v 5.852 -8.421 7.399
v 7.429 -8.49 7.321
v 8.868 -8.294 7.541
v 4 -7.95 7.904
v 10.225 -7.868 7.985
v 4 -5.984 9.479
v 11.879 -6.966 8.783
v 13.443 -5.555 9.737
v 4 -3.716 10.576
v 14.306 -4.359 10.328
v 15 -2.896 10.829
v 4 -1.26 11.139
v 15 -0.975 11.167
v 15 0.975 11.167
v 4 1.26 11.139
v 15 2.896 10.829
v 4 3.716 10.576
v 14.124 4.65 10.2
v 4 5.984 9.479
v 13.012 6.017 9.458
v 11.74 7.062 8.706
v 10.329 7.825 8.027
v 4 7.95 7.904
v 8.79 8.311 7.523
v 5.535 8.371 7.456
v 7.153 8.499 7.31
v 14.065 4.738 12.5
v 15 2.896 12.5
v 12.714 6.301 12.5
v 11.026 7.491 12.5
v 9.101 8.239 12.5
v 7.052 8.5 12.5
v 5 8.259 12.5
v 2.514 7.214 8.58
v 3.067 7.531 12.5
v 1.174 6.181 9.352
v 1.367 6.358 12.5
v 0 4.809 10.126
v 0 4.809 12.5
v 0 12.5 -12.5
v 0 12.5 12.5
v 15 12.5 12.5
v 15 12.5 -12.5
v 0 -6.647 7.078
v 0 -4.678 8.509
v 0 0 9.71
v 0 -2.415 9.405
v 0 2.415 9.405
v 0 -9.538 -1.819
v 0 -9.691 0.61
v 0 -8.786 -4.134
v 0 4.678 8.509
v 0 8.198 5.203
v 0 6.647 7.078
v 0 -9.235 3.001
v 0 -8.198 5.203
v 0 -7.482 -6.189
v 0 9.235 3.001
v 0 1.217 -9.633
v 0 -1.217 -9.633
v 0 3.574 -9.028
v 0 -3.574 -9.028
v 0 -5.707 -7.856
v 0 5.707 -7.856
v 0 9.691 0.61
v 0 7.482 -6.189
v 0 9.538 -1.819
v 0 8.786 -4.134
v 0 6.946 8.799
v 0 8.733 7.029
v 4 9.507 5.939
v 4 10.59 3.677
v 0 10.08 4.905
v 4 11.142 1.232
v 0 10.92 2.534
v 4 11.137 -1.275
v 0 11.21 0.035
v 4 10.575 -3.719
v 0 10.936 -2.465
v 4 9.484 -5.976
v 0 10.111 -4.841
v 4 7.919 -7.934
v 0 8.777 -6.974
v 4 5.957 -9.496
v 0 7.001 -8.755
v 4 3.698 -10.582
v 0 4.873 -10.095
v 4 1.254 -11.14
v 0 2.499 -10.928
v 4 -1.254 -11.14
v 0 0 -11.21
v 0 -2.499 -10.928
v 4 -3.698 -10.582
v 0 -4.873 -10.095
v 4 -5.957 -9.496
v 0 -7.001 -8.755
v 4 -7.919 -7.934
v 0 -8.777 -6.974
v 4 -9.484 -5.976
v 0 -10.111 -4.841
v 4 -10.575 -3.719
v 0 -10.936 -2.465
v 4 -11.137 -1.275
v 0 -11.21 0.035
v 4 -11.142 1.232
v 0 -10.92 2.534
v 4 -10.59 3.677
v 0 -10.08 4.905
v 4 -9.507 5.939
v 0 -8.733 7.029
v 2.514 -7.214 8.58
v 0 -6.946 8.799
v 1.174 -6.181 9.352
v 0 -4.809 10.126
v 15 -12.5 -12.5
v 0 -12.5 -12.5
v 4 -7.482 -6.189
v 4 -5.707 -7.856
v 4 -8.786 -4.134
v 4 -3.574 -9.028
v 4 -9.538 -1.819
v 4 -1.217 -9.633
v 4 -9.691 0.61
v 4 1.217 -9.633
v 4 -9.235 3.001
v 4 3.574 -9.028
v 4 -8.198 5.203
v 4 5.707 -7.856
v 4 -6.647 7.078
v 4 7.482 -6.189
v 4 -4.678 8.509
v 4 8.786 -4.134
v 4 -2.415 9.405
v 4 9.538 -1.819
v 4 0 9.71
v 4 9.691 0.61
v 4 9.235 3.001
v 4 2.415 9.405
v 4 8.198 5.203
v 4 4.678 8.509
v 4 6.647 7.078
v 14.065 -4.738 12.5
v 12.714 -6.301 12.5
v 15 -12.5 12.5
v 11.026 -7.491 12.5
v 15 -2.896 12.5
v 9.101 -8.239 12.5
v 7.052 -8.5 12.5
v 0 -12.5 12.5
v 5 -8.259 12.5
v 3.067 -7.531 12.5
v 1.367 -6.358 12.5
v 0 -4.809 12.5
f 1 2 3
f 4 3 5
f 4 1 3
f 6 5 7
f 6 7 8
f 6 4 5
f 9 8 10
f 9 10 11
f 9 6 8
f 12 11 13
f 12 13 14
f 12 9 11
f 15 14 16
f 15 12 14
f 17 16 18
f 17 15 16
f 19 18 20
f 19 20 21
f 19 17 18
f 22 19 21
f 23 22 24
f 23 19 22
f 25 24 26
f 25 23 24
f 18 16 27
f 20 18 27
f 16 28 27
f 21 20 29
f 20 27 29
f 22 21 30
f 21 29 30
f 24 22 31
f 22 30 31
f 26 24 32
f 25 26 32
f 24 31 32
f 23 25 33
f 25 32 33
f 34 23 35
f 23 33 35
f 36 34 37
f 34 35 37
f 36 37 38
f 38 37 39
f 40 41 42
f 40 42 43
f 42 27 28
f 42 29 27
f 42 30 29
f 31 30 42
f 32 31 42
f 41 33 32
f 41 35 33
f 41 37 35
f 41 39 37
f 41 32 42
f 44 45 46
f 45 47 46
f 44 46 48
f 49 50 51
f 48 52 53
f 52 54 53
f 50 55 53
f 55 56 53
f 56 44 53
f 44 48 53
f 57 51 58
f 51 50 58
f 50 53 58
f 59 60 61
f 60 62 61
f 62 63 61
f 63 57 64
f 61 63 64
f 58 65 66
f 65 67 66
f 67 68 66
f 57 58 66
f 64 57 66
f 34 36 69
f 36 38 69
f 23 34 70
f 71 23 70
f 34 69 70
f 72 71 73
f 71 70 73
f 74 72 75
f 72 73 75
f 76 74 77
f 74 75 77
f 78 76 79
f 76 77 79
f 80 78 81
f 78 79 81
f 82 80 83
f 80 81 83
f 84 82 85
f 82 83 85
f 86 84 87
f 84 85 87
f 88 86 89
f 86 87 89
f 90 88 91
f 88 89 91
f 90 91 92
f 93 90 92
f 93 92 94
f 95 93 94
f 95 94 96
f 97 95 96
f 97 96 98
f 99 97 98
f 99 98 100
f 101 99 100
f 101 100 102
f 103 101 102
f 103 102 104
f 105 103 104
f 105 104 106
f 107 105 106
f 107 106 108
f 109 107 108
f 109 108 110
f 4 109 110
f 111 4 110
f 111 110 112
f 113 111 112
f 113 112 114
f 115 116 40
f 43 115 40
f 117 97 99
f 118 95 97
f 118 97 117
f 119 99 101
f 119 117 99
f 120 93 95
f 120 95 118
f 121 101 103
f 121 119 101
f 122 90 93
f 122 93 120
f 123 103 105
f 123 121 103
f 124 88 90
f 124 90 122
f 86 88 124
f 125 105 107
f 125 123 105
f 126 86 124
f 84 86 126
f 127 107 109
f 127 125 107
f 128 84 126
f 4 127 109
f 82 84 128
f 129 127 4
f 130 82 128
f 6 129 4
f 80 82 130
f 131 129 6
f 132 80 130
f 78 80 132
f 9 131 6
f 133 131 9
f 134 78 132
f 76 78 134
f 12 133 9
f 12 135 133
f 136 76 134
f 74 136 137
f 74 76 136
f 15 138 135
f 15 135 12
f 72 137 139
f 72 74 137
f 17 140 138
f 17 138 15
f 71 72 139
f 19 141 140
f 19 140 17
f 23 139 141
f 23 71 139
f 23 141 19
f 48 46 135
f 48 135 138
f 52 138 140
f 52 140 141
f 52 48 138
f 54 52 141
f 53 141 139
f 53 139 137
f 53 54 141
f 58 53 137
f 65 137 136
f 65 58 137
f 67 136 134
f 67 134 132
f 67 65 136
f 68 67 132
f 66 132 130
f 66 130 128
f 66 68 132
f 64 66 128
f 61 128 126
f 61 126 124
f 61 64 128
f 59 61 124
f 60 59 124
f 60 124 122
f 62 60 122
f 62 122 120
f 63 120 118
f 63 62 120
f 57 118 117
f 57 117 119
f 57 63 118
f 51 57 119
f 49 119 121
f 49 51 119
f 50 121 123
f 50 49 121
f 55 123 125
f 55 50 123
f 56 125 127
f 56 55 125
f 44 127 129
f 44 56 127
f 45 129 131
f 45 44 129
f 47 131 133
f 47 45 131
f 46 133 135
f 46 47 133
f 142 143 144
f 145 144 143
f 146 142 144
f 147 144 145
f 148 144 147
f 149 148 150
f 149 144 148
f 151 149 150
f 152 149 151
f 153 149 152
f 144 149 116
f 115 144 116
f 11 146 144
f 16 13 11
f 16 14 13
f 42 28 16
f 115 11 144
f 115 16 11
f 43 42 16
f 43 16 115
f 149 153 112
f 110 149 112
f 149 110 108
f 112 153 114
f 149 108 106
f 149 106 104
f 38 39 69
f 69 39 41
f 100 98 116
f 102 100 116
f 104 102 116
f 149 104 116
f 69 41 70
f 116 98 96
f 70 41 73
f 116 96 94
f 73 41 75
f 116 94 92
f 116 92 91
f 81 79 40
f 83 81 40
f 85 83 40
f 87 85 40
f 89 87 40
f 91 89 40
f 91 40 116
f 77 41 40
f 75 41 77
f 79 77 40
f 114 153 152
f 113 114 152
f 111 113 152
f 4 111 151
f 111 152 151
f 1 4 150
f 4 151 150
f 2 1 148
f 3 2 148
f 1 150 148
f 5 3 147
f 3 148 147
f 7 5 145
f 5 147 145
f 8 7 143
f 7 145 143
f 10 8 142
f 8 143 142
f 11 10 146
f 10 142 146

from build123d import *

# Parameters (mm, degrees)
SKETCH1_W               = 25
SKETCH1_H               = 25
BOSS_EXTRUDE1_DEPTH     = 15
SKETCH2_R               = 11.21
SKETCH2_R_2             = 9.71
CUT_EXTRUDE1_DEPTH      = 4
CUT_EXTRUDE4_REACH      = 33.721
CUT_EXTRUDE4_END_RADIUS = 11.21
SKETCH4_R               = 8.5


with BuildPart() as part:
    # Sketch1 → Boss-Extrude1 (new body)
    with BuildSketch(Plane(origin=(0, 0, 0), x_dir=(0, 0, -1), z_dir=(1, 0, 0))):
        Rectangle(SKETCH1_W, SKETCH1_H)
    extrude(amount=BOSS_EXTRUDE1_DEPTH)

    # Sketch2 → Cut-Extrude1 (cut)
    with BuildSketch(Plane.ZY):
        Circle(SKETCH2_R)
        Circle(SKETCH2_R_2, mode=Mode.SUBTRACT)
    extrude(amount=-CUT_EXTRUDE1_DEPTH, mode=Mode.SUBTRACT)

    # Cut-Extrude4: up to this cylinder (the profile starts outside it)
    cut_extrude4_end = Plane(origin=(7.008609, 0, 0), z_dir=(-1, 0, 0)) * Cylinder(CUT_EXTRUDE4_END_RADIUS, 90.862, mode=Mode.PRIVATE)
    # Sketch4 → Cut-Extrude4 (cut, up to the surface)
    with BuildSketch(Plane.XY.offset(12.5), mode=Mode.PRIVATE) as cut_extrude4_sk1:
        with Locations((7.008609298, 0)):
            Circle(SKETCH4_R)
    cut_extrude4_tool1 = extrude(cut_extrude4_sk1.sketch, amount=-CUT_EXTRUDE4_REACH, mode=Mode.PRIVATE) - cut_extrude4_end
    add(cut_extrude4_tool1.solids().sort_by_distance((7.008609, 0, 12.5))[0], mode=Mode.SUBTRACT)


solid = part.part
